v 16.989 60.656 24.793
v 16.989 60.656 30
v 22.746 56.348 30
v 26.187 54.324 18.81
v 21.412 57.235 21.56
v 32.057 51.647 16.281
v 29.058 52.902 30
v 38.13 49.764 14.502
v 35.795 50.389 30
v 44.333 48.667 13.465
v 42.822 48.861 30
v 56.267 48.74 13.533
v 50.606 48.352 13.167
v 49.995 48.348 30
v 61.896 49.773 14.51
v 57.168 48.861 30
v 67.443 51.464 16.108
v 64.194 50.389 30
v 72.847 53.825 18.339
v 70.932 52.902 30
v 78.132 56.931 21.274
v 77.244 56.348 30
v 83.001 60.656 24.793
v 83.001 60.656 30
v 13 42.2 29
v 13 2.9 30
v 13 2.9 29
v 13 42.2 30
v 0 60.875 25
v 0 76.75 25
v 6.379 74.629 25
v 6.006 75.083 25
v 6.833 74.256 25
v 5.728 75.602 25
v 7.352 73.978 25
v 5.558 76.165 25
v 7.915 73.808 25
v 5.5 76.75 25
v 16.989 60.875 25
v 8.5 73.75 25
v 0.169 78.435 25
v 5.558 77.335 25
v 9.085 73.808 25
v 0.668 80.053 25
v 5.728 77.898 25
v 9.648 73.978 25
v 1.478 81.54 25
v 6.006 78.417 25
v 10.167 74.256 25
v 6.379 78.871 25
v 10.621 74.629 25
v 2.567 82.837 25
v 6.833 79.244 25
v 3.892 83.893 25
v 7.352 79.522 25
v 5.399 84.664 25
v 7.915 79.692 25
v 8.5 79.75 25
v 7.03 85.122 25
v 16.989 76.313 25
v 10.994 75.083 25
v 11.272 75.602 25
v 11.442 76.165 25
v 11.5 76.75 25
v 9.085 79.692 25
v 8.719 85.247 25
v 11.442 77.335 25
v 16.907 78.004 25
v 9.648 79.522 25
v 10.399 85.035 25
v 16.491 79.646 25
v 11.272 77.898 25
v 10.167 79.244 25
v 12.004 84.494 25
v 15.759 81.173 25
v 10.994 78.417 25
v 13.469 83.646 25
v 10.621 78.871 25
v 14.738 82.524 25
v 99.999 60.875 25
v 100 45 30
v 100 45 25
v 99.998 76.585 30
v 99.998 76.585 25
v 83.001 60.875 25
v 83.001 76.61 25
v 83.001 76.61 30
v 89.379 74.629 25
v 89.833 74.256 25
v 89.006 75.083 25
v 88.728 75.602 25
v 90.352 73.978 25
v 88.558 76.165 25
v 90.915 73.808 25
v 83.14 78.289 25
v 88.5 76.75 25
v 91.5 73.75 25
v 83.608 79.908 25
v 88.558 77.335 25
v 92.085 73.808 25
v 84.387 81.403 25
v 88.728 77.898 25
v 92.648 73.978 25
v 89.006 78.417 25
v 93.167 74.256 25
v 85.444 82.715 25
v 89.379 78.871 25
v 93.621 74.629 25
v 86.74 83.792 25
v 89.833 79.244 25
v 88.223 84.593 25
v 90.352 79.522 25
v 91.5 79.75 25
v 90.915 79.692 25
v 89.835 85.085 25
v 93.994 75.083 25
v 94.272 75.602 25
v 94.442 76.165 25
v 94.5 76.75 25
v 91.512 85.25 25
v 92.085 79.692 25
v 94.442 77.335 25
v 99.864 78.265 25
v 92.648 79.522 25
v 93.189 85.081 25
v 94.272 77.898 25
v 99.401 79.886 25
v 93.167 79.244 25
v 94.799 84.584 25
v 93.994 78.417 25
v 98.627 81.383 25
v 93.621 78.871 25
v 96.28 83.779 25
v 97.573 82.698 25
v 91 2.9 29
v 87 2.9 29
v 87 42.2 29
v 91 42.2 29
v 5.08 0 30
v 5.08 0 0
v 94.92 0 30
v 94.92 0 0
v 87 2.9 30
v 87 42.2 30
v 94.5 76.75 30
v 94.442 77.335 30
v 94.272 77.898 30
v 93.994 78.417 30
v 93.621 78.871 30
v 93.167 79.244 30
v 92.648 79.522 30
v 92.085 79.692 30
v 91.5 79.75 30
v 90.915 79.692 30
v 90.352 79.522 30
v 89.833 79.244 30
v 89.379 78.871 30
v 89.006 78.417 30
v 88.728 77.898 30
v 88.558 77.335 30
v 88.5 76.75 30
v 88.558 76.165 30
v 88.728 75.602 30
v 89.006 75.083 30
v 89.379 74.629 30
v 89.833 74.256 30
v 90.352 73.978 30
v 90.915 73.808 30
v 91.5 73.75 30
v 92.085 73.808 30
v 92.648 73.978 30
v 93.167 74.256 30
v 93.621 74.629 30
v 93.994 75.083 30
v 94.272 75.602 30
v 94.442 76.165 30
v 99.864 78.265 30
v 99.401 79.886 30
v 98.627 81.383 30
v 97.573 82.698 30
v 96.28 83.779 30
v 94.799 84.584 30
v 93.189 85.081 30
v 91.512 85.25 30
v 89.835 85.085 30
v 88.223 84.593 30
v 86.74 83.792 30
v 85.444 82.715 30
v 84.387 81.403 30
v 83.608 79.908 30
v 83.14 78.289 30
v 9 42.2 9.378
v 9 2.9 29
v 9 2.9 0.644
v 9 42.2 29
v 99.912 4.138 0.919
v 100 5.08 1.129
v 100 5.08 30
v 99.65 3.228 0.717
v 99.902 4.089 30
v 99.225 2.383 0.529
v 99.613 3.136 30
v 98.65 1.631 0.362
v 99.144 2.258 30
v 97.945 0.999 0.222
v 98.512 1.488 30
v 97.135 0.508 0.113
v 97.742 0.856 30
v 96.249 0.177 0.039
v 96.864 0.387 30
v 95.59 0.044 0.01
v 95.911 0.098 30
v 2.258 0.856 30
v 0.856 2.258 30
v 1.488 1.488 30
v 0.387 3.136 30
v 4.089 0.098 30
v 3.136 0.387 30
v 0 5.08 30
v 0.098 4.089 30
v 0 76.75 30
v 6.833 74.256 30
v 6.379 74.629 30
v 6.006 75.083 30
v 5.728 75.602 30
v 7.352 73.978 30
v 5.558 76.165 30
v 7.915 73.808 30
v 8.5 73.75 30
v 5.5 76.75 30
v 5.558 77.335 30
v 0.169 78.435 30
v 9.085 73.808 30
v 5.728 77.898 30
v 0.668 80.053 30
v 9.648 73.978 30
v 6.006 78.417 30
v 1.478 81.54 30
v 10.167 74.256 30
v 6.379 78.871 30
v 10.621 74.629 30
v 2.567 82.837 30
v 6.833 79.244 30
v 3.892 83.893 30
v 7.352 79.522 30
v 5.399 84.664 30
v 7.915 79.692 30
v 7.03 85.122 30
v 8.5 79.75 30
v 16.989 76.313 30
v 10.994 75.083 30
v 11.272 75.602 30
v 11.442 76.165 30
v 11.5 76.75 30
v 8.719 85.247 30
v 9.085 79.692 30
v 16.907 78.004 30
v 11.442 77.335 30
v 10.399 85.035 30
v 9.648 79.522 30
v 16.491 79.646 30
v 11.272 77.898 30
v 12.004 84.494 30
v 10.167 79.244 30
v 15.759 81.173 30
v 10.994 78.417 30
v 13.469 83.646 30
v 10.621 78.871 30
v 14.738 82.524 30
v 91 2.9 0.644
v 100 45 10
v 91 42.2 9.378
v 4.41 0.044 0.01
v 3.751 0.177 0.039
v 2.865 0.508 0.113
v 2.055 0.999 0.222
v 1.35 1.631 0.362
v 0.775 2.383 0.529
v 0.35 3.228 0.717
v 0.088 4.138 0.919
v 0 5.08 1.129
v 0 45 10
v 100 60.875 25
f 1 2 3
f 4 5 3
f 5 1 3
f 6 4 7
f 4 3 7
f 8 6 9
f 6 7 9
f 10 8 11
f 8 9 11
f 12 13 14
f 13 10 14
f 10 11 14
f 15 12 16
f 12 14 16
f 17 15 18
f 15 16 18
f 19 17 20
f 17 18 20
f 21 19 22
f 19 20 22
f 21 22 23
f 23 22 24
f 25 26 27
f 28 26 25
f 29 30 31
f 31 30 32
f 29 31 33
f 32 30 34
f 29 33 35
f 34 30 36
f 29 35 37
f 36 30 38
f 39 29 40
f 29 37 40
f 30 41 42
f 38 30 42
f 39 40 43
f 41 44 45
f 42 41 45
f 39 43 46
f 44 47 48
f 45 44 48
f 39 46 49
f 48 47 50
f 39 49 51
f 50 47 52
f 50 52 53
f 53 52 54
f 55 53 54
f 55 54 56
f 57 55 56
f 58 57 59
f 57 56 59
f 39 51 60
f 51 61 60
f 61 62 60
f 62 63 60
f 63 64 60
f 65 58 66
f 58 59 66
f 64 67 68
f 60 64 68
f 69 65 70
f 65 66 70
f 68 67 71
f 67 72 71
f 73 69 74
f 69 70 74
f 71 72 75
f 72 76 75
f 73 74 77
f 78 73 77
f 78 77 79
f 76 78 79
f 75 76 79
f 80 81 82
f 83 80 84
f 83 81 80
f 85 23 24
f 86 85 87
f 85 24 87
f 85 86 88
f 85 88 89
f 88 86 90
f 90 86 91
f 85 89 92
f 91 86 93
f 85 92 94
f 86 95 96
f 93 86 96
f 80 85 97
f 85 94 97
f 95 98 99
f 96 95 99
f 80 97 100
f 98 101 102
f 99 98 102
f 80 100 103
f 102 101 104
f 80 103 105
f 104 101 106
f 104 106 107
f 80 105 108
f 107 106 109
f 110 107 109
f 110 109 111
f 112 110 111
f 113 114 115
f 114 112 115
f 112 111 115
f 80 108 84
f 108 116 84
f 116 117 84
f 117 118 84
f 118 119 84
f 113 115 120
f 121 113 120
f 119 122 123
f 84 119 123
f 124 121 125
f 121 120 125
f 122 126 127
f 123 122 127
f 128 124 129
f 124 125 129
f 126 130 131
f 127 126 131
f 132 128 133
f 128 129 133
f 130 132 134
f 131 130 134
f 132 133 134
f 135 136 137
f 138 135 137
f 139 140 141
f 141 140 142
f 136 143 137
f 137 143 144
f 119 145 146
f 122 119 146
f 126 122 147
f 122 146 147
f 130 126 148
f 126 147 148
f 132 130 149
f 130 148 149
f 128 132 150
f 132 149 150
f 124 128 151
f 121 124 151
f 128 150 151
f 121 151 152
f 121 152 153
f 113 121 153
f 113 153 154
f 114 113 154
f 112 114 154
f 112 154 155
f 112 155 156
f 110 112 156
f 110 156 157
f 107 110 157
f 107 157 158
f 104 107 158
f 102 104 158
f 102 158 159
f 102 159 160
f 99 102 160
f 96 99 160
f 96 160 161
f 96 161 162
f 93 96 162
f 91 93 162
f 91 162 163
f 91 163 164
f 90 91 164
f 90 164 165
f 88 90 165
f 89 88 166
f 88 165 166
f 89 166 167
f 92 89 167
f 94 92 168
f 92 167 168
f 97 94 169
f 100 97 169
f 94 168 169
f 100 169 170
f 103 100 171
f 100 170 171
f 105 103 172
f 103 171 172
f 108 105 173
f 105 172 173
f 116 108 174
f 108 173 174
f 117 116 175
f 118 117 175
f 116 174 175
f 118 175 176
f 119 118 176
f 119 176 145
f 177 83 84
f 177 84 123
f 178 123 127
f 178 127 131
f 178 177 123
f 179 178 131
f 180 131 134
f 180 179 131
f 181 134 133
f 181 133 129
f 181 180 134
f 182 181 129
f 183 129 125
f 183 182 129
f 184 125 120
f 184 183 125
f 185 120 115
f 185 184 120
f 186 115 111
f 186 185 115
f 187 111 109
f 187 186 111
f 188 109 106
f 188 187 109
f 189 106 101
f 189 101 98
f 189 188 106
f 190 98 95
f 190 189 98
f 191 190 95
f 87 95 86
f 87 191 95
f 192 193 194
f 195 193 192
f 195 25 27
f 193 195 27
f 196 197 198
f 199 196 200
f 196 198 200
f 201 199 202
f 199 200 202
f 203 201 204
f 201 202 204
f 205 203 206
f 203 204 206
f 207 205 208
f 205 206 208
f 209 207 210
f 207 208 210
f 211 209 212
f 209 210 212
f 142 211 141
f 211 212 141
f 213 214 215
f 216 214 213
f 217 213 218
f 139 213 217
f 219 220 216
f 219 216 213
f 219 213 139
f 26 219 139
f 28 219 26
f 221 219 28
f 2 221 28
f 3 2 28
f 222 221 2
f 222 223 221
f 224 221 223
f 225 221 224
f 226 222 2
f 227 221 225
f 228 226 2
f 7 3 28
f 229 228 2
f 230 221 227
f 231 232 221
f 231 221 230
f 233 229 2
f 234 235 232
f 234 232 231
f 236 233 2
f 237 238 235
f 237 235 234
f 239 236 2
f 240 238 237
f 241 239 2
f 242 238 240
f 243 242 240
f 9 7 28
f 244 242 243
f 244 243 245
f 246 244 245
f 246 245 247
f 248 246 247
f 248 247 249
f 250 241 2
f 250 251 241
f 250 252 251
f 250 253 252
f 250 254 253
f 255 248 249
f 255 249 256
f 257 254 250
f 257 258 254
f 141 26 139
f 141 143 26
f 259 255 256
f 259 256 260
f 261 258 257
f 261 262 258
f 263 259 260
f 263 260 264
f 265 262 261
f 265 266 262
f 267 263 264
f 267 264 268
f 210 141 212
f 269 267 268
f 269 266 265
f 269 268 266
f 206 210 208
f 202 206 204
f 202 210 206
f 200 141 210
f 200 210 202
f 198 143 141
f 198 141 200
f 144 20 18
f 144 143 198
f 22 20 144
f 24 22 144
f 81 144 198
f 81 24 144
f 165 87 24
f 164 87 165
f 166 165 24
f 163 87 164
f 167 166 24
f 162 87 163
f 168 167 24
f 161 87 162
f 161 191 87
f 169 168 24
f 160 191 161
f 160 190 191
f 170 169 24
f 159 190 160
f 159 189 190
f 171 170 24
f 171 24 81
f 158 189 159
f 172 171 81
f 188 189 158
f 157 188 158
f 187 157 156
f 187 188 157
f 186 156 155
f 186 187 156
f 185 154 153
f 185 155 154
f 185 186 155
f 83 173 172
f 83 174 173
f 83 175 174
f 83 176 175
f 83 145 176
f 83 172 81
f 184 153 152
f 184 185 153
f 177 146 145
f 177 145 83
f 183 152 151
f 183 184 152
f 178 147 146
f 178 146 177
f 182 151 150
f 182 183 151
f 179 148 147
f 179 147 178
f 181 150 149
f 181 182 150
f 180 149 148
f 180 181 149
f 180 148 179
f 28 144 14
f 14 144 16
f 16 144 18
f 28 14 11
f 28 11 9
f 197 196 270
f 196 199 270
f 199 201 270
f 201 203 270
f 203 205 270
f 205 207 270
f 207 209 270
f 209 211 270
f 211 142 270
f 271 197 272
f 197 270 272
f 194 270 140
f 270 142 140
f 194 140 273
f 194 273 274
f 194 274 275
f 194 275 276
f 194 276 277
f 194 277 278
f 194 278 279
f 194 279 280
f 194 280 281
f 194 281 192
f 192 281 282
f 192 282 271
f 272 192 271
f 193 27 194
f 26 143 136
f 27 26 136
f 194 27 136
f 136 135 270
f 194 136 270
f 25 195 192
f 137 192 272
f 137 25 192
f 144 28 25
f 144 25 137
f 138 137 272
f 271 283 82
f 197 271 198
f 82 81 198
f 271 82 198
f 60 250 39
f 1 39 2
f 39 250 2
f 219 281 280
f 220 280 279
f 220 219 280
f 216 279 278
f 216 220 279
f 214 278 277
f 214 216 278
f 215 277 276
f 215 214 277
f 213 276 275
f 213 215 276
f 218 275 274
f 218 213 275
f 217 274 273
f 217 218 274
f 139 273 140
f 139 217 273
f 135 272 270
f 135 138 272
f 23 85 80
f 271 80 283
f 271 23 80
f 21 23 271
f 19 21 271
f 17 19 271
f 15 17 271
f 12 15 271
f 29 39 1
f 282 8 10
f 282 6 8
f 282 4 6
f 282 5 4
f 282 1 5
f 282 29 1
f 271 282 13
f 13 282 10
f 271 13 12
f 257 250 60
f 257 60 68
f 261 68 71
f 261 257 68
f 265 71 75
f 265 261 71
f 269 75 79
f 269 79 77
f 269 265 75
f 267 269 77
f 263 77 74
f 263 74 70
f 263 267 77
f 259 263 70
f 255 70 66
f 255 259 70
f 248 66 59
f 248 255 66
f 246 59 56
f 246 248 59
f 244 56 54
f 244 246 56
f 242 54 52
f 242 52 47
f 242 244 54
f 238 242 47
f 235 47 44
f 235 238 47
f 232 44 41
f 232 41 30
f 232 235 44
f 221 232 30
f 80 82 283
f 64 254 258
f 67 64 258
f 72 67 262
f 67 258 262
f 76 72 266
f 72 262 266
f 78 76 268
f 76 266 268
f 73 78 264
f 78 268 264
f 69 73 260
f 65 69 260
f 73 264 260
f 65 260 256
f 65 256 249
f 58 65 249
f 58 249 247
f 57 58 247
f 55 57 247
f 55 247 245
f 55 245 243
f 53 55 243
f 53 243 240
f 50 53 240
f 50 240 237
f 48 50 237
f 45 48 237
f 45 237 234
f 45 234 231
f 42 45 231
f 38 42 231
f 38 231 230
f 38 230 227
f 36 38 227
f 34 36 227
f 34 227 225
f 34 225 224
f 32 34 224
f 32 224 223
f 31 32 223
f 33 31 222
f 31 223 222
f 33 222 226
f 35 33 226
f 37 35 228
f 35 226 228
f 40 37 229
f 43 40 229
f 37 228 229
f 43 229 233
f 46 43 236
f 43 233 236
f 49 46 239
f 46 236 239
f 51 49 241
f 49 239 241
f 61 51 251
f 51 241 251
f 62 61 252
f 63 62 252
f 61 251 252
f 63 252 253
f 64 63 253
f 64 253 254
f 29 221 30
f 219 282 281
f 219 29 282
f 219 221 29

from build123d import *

# Parameters (mm, degrees)
F0_W      = 100
F0_H      = 45
F1_DEPTH  = 30
F2_W      = 74
F2_H      = 39.3
F3_DEPTH  = 30.001
F5_DEPTH  = 100.001
F7_DEPTH  = 5
F10_DEPTH = 100
F12_DEPTH = 25.4
F13_R     = 3
F14_DEPTH = 25.4
F15_R     = 5.08
F17_DEPTH = 4
F19_DEPTH = 4


with BuildPart() as f1:
    # F0 (on Top) → F1 (new body)
    with BuildSketch(Plane.XY):
        with Locations((50, 22.5)):
            Rectangle(F0_W, F0_H)
    extrude(amount=F1_DEPTH)

    # F2 (on face) → F3 (cut, through all)
    with BuildSketch(Plane.XY.offset(30)):
        with Locations((50, 22.55)):
            Rectangle(F2_W, F2_H)
    extrude(amount=-F3_DEPTH, mode=Mode.SUBTRACT)

    # F4 (on face) → F5 (cut, through all)
    with BuildSketch(Plane(origin=(0, 0, 0), x_dir=(0, -1, 0), z_dir=(-1, 0, 0))):
        Polygon((-45, 0), (0, 0), (-45, 10), align=None)
    extrude(amount=-F5_DEPTH, mode=Mode.SUBTRACT)

    # F6 (on face) → F7 (join)
    with BuildSketch(Plane.XY.offset(30)):
        with BuildLine():
            Line((16.9887500545, 60.6564121963), (16.9887500545, 76.3128243926))
            ThreePointArc((16.9887500545, 76.3128243926), (8.7186601661, 85.2471870482), (0, 76.75))
            Line((0, 76.75), (0, 45))
            Line((0, 45), (100, 45))
            Line((100, 45), (99.9984056515, 76.5853750228))
            ThreePointArc((99.9984056515, 76.5853750228), (91.5120769432, 85.2499914204), (83.0011608569, 76.609525019))
            Line((83.0011608569, 76.609525019), (83.0011608569, 60.6564121963))
            Line((83.0011608569, 60.6564121963), (16.9887500545, 60.6564121963))
        make_face()
    extrude(amount=-F7_DEPTH)

    # F8: union 

    # F9 (on face) → F10 (join)
    with BuildSketch(Plane(origin=(0, 0, 0), x_dir=(0, -1, 0), z_dir=(-1, 0, 0))):
        Polygon((-60.875, 25), (-45, 10), (-45, 25), align=None)
    extrude(amount=-F10_DEPTH)

    # F11 (on face) → F12 (cut)
    with BuildSketch(Plane.XY.offset(30)):
        with BuildLine():
            Line((16.9887500545, 65.0414451957), (16.9887500545, 60.6564121963))
            ThreePointArc((16.9887500545, 60.6564121963), (49.9949554557, 48.3478851896), (83.0011608569, 60.6564121963))
            Line((83.0011608569, 60.6564121963), (83.0011608569, 65.0414451957))
            Line((83.0011608569, 65.0414451957), (16.9887500545, 65.0414451957))
        make_face()
    extrude(amount=-F12_DEPTH, mode=Mode.SUBTRACT)

    # F13 (on face) → F14 (cut)
    with BuildSketch(Plane.XY.offset(30)):
        with Locations((8.5, 76.75)):
            Circle(F13_R)
        with Locations((91.5, 76.75)):
            Circle(F13_R)
    extrude(amount=-F14_DEPTH, mode=Mode.SUBTRACT)

    # F15
    f15_edges = [f1.edges().sort_by_distance(p)[0] for p in [
        (0, 0, 15),
        (100, 0, 15),
    ]]
    fillet(f15_edges, radius=F15_R)

    # F16 (on face) → F17 (cut)
    with BuildSketch(Plane.YZ.offset(13)):
        Polygon((2.9, 29), (2.9, 0.6444444444), (42.2, 9.3777777778), (42.2, 29), align=None)
    extrude(amount=-F17_DEPTH, mode=Mode.SUBTRACT)

    # F18 (on face) → F19 (cut)
    with BuildSketch(Plane(origin=(87, 0, 0), x_dir=(0, -1, 0), z_dir=(-1, 0, 0))):
        Polygon((-42.2, 9.3777777778), (-2.9, 0.6444444444), (-2.9, 29), (-42.2, 29), align=None)
    extrude(amount=-F19_DEPTH, mode=Mode.SUBTRACT)


solid = f1.part
